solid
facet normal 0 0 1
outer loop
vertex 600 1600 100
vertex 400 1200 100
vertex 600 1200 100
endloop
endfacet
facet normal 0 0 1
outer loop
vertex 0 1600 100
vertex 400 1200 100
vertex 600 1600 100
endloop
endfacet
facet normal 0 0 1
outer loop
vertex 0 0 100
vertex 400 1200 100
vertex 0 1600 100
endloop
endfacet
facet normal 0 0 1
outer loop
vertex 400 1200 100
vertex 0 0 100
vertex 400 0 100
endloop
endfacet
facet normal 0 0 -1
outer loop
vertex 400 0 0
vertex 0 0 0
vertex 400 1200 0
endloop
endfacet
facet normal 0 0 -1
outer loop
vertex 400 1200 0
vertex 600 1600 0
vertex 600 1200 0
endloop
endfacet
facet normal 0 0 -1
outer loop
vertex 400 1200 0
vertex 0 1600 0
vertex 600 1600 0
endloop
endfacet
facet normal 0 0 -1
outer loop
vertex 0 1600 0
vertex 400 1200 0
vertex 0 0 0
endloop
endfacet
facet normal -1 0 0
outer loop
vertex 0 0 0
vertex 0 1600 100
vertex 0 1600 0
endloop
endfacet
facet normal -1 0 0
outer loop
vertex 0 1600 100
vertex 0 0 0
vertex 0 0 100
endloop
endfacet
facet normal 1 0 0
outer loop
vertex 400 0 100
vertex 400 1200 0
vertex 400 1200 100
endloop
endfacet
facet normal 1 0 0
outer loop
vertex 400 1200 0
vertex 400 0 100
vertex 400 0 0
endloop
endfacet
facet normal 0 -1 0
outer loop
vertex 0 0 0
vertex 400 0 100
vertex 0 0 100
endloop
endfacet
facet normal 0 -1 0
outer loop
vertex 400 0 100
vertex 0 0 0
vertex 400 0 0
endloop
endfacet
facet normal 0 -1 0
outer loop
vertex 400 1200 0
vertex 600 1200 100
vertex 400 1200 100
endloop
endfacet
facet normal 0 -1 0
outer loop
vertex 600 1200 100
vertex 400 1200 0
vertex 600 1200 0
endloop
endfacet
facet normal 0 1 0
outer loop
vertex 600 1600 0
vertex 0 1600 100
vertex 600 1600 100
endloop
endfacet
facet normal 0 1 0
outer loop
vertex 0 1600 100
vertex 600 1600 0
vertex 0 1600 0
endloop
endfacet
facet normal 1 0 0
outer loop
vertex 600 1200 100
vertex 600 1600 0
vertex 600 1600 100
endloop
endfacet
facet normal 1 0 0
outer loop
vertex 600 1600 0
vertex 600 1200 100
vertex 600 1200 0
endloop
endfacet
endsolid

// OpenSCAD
DESK_DIMENSIONS = [200, 100, 100];
DESKS_PER_ROW = [2, 2, 2, 3];

// Module desk block and empty space
module createDeskBlock(dimensions) {
    module desk() {
        cube(dimensions);
    }

    module emptySpace() {
        translate([0, dimensions[1], 0])
            color("orchid", 0.5)
                cube(dimensions);
    }

    desk();
    emptySpace();
}


module createDeskRow(dimensions, numDesks) {
    for (i = [0 : numDesks - 1]) {
        translate([i * dimensions[0], 0, 0])
            createDeskBlock(dimensions);
    }
}

module createOppositeDeskLayout(numDesks, numDesksOpposite) {
    let (yOffset = (2 * DESK_DIMENSIONS[1])) {
        translate([0, yOffset, 0]) {
            createDeskRow(dimensions = DESK_DIMENSIONS, numDesks = numDesks);
            let (xOffset = (numDesksOpposite * DESK_DIMENSIONS[0])) {
                translate([xOffset, 0, 0])
                    rotate([0, 0, 180])
                        createDeskRow(dimensions = DESK_DIMENSIONS, numDesks = numDesksOpposite);
            }
        }
    }
}

module OfficeDesks() {
    let (nrRows = len(DESKS_PER_ROW))
    for (i = [0 : nrRows - 1]) {
        let (yOffset = (4 * DESK_DIMENSIONS[1])) {
            translate([0, yOffset * i, 0])
                createOppositeDeskLayout(DESKS_PER_ROW[i], DESKS_PER_ROW[i]);
        }
    }
}

OfficeDesks();
